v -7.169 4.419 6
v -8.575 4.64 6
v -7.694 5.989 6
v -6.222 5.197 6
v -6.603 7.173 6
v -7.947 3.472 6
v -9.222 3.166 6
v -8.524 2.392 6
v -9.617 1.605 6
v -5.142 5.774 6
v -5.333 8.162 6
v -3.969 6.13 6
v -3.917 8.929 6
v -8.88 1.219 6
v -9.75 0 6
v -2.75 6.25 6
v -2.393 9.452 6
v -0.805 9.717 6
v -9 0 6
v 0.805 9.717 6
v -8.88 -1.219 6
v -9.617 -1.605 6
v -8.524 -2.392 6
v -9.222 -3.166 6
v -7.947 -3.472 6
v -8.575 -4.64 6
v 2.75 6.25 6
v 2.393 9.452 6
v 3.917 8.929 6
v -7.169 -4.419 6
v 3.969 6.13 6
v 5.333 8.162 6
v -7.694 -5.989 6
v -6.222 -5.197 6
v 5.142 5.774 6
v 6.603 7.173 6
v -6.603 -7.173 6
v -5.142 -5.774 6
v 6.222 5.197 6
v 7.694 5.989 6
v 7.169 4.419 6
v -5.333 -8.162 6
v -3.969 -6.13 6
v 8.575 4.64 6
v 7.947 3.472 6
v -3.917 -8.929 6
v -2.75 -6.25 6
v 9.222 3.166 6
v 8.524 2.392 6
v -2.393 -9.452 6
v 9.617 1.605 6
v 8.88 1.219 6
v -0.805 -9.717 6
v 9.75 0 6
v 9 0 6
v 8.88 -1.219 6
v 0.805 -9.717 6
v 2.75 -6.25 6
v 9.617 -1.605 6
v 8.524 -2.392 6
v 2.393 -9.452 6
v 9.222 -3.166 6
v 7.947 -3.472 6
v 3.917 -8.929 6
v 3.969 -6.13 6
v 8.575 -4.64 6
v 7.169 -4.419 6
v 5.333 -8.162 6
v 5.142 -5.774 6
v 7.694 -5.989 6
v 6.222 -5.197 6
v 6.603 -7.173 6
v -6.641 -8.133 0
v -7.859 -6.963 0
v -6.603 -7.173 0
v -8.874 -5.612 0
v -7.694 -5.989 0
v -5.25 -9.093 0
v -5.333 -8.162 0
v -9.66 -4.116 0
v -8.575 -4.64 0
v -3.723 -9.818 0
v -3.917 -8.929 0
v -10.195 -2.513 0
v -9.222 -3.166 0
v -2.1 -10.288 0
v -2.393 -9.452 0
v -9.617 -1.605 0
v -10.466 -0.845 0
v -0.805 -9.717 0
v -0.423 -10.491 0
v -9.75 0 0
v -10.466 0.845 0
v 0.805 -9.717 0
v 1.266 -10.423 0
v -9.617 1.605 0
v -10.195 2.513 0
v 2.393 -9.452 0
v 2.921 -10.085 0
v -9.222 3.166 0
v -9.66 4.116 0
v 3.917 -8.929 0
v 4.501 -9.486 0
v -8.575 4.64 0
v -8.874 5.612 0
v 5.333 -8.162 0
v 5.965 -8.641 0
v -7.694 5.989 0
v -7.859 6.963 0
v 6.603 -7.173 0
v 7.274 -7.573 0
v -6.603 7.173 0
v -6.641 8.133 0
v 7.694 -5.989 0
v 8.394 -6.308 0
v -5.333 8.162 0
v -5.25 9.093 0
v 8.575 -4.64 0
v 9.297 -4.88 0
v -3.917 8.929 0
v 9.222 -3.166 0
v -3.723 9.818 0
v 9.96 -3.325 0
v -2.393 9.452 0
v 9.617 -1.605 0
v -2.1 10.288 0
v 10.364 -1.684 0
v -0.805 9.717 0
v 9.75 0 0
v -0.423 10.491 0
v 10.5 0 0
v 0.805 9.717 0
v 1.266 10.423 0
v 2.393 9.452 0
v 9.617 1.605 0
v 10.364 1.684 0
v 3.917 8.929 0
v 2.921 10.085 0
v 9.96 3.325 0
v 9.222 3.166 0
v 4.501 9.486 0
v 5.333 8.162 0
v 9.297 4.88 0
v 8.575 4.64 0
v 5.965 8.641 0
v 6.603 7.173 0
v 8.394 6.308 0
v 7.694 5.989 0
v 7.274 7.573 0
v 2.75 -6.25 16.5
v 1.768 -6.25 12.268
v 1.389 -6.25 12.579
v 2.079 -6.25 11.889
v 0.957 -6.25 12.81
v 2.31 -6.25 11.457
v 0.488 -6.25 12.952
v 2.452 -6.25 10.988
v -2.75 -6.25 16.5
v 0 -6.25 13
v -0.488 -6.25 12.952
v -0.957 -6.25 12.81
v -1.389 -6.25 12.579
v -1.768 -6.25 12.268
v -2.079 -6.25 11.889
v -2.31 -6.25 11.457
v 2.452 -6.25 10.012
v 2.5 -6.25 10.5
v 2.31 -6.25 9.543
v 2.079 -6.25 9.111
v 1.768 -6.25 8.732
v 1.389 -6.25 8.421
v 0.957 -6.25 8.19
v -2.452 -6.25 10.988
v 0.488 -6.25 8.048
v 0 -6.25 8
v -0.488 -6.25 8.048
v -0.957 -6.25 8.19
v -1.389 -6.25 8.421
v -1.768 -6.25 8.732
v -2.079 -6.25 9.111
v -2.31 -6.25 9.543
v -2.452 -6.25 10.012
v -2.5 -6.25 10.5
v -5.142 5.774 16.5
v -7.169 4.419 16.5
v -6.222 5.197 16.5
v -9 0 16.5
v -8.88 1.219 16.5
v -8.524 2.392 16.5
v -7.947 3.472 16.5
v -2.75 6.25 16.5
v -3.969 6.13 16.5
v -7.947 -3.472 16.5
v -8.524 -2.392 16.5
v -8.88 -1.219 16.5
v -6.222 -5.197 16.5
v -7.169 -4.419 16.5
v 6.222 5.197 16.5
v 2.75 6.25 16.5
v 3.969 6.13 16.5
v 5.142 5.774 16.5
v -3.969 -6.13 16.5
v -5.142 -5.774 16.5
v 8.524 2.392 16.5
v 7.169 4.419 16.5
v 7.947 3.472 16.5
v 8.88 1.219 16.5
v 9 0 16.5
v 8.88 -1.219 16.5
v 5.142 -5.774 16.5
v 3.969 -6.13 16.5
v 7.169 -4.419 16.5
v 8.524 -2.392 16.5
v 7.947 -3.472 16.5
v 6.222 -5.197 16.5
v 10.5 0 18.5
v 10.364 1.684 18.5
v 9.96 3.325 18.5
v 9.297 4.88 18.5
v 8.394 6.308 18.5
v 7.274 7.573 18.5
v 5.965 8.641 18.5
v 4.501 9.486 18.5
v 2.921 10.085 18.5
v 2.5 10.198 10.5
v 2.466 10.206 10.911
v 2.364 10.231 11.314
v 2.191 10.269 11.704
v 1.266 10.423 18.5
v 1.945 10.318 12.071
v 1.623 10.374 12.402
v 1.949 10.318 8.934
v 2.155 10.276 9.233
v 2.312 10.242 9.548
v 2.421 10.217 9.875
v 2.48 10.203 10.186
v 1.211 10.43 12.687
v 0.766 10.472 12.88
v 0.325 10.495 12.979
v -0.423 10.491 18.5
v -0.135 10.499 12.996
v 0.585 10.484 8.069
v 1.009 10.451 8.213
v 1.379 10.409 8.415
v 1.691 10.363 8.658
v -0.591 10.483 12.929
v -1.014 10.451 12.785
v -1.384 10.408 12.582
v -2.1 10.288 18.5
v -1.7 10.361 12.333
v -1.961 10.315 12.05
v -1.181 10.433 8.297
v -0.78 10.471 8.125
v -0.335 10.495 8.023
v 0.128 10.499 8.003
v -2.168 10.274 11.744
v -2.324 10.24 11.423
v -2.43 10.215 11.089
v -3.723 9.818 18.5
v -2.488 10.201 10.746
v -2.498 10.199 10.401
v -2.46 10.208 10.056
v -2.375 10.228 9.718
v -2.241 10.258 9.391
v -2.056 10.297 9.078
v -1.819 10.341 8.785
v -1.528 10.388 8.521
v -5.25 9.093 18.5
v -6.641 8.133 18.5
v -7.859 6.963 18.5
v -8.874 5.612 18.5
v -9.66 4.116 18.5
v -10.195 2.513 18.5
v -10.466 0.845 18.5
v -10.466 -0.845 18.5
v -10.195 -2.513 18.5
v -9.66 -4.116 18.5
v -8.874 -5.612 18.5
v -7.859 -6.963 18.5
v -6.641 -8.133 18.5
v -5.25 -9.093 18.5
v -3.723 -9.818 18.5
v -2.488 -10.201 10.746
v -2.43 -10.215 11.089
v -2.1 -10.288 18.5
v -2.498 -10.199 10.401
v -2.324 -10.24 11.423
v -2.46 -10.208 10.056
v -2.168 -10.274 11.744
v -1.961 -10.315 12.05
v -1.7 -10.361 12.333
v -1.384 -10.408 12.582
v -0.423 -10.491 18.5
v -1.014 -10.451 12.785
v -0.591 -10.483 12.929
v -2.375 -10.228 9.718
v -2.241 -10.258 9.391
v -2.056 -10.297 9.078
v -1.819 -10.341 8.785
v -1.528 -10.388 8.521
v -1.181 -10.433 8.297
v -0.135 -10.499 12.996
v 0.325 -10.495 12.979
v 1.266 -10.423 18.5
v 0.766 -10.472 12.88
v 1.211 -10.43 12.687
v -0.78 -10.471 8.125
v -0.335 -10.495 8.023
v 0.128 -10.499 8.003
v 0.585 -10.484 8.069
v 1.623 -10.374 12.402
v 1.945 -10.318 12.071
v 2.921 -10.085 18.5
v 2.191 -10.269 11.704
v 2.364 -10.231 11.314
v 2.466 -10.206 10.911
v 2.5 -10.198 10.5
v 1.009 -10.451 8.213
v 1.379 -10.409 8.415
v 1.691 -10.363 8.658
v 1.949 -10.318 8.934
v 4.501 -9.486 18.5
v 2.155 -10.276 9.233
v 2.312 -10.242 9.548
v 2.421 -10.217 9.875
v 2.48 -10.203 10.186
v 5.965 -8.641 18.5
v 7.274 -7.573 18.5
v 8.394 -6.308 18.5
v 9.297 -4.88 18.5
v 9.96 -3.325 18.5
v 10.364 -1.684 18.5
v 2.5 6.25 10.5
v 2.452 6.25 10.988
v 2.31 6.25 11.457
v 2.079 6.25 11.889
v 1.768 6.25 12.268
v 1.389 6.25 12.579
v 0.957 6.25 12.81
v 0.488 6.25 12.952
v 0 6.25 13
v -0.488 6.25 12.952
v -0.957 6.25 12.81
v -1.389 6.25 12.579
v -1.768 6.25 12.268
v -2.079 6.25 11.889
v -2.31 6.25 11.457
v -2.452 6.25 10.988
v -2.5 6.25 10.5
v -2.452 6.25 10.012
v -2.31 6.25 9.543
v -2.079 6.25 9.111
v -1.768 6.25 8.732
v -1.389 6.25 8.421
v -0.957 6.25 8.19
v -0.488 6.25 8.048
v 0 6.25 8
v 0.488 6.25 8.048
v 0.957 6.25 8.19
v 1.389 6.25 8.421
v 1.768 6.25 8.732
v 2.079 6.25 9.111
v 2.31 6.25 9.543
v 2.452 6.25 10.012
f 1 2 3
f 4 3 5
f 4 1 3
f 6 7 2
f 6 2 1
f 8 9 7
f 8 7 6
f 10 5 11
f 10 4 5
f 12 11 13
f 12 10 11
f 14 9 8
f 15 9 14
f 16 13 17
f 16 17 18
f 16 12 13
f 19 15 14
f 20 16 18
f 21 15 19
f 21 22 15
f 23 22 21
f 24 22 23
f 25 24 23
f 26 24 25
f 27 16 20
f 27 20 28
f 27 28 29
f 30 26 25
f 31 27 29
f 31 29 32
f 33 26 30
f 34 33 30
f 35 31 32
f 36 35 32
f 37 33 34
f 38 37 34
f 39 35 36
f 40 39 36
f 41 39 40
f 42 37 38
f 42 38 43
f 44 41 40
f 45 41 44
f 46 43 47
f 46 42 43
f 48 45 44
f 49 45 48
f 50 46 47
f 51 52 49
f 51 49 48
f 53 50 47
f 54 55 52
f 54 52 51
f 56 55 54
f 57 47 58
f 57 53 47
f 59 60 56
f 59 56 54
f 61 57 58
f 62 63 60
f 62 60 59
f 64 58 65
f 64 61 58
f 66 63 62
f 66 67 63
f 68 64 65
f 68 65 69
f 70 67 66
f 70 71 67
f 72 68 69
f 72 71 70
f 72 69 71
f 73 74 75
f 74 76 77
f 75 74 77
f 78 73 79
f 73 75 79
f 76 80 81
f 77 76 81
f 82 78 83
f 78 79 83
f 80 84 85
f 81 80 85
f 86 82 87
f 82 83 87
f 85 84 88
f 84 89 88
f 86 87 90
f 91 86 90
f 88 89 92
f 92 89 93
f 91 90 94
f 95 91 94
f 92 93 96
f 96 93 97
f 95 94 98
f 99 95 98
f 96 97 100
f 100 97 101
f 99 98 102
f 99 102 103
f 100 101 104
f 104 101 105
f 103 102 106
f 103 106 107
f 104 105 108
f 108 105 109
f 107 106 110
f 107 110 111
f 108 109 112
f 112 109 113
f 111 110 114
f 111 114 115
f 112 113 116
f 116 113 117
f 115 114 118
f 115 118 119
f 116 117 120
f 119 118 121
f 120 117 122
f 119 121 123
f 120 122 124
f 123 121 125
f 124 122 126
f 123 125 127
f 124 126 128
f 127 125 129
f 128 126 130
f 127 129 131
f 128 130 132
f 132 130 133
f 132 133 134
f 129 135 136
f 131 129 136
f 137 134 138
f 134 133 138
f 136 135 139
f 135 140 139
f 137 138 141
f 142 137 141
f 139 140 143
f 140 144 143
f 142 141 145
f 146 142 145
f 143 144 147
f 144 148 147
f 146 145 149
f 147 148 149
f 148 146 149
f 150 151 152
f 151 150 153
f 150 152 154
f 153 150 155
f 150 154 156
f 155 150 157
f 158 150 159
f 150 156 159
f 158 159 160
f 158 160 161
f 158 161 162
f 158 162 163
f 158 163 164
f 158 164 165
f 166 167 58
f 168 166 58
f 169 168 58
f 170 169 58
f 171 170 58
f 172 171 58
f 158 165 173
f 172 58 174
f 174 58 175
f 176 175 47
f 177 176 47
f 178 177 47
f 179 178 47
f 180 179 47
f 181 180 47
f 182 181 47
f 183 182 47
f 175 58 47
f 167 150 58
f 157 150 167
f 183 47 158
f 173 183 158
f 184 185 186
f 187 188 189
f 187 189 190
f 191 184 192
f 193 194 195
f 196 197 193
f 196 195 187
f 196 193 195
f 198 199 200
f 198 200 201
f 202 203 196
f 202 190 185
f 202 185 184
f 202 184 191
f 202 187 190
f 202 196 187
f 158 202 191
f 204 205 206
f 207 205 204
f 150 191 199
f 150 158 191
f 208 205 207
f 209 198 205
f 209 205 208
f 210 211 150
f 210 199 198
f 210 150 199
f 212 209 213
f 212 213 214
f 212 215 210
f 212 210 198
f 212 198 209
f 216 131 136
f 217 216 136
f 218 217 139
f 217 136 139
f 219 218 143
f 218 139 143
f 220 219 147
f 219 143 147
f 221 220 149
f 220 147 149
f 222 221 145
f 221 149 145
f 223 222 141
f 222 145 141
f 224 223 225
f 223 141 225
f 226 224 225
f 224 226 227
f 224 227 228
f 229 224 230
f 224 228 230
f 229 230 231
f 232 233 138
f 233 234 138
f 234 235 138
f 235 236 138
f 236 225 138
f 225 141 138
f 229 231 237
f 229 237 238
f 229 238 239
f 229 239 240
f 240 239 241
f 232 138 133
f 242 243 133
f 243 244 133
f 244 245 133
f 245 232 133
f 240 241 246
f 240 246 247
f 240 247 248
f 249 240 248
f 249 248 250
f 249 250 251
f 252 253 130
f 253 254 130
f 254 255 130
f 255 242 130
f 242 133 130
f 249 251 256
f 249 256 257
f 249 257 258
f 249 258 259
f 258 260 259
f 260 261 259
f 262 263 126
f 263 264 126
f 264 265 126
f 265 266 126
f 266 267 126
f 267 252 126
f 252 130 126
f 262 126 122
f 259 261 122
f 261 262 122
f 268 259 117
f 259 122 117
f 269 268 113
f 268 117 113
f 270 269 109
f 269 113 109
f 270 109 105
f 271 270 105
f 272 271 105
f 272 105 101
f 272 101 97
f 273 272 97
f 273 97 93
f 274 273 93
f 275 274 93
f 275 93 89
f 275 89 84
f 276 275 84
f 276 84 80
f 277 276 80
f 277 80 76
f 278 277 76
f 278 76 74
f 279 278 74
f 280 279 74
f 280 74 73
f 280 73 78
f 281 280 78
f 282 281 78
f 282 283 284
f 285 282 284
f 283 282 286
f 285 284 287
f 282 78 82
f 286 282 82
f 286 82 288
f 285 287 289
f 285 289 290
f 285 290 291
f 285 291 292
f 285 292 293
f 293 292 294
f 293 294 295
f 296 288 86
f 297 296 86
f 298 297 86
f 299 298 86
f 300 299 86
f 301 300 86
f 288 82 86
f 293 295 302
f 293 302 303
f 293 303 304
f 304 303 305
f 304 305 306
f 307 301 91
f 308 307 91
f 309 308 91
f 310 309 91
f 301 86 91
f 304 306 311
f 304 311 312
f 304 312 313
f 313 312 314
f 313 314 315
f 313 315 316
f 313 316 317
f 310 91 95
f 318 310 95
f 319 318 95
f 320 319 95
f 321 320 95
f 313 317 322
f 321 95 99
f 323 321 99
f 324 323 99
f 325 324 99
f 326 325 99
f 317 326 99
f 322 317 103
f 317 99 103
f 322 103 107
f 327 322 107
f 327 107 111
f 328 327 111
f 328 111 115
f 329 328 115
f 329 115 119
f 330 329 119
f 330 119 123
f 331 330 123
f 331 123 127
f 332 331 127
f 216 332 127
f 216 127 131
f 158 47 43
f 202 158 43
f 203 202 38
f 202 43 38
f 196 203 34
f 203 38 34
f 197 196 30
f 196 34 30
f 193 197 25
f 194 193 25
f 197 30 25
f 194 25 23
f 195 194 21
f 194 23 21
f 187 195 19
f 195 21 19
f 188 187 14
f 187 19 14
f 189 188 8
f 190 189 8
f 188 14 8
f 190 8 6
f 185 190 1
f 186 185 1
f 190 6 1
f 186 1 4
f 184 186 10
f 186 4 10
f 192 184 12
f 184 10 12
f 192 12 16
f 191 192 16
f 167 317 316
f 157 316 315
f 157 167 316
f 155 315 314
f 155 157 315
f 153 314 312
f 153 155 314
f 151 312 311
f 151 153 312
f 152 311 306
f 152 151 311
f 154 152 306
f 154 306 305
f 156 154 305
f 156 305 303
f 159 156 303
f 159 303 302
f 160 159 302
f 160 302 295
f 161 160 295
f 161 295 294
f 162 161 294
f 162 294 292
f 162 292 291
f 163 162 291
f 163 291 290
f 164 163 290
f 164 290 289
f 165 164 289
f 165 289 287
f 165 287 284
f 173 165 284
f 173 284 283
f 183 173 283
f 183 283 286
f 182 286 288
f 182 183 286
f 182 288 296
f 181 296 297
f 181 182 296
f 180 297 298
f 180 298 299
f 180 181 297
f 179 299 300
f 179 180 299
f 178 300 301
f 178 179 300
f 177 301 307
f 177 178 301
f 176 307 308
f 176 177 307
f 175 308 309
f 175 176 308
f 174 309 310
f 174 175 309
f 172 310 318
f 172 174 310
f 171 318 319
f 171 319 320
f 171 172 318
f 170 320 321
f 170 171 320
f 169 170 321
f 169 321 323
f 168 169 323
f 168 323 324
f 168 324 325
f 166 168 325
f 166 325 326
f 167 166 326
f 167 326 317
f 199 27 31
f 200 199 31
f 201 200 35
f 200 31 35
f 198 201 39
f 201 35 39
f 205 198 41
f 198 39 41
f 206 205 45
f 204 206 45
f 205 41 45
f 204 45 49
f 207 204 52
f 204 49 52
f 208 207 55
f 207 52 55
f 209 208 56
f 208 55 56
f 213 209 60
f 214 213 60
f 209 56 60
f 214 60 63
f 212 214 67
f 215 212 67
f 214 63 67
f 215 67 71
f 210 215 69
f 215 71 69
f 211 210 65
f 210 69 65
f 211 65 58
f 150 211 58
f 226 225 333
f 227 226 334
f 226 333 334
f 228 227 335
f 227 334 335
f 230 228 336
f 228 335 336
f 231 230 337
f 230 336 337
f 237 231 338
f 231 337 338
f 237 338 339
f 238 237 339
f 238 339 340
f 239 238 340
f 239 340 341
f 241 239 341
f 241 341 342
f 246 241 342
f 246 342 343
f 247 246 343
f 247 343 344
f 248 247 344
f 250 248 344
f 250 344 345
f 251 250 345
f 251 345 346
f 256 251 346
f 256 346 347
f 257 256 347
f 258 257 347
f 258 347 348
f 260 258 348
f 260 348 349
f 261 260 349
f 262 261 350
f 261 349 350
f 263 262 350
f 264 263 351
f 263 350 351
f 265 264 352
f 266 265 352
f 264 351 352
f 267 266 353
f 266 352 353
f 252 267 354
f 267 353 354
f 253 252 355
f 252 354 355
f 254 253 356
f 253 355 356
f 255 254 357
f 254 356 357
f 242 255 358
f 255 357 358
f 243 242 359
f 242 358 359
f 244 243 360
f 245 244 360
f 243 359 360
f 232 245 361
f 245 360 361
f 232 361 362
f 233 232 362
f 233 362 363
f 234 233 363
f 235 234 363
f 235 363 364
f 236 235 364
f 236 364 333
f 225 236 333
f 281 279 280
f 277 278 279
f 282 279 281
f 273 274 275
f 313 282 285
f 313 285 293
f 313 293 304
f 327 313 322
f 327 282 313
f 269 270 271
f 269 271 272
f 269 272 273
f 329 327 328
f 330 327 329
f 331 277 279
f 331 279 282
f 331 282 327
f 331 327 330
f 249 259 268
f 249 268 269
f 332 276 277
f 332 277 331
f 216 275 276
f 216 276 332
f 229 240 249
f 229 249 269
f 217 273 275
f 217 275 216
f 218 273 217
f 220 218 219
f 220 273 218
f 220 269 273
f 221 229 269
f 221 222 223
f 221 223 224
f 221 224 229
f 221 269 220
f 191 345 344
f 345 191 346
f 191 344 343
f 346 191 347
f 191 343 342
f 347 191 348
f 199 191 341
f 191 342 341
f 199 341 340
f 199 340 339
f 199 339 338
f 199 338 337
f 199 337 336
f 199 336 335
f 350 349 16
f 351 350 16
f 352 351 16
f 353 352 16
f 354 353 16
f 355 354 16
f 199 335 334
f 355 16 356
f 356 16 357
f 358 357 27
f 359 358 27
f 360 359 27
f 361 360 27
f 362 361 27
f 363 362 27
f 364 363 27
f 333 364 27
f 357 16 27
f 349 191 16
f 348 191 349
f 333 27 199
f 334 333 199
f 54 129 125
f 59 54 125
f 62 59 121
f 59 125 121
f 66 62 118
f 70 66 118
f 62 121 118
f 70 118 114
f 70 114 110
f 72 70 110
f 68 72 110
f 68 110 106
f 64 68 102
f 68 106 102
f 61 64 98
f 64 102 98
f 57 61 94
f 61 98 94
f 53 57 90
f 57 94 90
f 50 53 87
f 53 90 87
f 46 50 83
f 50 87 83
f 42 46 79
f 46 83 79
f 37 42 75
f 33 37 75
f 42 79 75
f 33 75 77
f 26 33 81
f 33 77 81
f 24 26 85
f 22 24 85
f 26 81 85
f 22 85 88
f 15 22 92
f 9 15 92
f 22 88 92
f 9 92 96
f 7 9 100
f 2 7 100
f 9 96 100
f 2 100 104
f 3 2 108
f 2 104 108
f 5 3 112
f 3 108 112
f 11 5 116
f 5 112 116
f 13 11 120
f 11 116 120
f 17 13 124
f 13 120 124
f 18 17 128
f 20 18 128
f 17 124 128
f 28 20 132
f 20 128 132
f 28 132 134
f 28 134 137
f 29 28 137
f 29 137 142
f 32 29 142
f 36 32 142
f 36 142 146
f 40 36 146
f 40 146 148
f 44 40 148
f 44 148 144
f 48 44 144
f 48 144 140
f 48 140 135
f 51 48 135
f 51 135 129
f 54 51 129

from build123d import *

# Parameters (mm, degrees)
F0_R          = 10.5
F1_DEPTH      = 18.5
F3_DEPTH      = 16.5
F4_R          = 9.75
F5_DEPTH      = 6
F6_R          = 2.5
F7_DEPTH      = 10.501
F7_DEPTH_BACK = 10.501


with BuildPart() as f1:
    # F0 (on Top) → F1 (new body)
    with BuildSketch(Plane.XY):
        Circle(F0_R)
    extrude(amount=F1_DEPTH)

    # F2 (on face) → F3 (cut)
    with BuildSketch(Plane(origin=(0, 0, 0), x_dir=(1, 0, 0), z_dir=(0, 0, -1))):
        with BuildLine():
            Line((2.75, 6.25), (-2.75, 6.25))
            ThreePointArc((-2.75, 6.25), (-9, 0), (-2.75, -6.25))
            Line((-2.75, -6.25), (2.75, -6.25))
            ThreePointArc((2.75, -6.25), (9, 0), (2.75, 6.25))
        make_face()
    extrude(amount=-F3_DEPTH, mode=Mode.SUBTRACT)

    # F4 (on face) → F5 (cut)
    with BuildSketch(Plane(origin=(0, 0, 0), x_dir=(1, 0, 0), z_dir=(0, 0, -1))):
        Circle(F4_R)
        with BuildLine():
            Line((-2.75, 6.25), (2.75, 6.25))
            ThreePointArc((2.75, 6.25), (9, 0), (2.75, -6.25))
            Line((2.75, -6.25), (-2.75, -6.25))
            ThreePointArc((-2.75, -6.25), (-9, 0), (-2.75, 6.25))
        make_face(mode=Mode.SUBTRACT)
    extrude(amount=-F5_DEPTH, mode=Mode.SUBTRACT)

    # F6 (on Front) → F7 (cut, two sides)
    with BuildSketch(Plane.XZ) as f7_sk:
        with Locations((0, 10.5)):
            Circle(F6_R)
    extrude(amount=-F7_DEPTH, mode=Mode.SUBTRACT)
    extrude(f7_sk.sketch, amount=F7_DEPTH_BACK, mode=Mode.SUBTRACT)


solid = f1.part
